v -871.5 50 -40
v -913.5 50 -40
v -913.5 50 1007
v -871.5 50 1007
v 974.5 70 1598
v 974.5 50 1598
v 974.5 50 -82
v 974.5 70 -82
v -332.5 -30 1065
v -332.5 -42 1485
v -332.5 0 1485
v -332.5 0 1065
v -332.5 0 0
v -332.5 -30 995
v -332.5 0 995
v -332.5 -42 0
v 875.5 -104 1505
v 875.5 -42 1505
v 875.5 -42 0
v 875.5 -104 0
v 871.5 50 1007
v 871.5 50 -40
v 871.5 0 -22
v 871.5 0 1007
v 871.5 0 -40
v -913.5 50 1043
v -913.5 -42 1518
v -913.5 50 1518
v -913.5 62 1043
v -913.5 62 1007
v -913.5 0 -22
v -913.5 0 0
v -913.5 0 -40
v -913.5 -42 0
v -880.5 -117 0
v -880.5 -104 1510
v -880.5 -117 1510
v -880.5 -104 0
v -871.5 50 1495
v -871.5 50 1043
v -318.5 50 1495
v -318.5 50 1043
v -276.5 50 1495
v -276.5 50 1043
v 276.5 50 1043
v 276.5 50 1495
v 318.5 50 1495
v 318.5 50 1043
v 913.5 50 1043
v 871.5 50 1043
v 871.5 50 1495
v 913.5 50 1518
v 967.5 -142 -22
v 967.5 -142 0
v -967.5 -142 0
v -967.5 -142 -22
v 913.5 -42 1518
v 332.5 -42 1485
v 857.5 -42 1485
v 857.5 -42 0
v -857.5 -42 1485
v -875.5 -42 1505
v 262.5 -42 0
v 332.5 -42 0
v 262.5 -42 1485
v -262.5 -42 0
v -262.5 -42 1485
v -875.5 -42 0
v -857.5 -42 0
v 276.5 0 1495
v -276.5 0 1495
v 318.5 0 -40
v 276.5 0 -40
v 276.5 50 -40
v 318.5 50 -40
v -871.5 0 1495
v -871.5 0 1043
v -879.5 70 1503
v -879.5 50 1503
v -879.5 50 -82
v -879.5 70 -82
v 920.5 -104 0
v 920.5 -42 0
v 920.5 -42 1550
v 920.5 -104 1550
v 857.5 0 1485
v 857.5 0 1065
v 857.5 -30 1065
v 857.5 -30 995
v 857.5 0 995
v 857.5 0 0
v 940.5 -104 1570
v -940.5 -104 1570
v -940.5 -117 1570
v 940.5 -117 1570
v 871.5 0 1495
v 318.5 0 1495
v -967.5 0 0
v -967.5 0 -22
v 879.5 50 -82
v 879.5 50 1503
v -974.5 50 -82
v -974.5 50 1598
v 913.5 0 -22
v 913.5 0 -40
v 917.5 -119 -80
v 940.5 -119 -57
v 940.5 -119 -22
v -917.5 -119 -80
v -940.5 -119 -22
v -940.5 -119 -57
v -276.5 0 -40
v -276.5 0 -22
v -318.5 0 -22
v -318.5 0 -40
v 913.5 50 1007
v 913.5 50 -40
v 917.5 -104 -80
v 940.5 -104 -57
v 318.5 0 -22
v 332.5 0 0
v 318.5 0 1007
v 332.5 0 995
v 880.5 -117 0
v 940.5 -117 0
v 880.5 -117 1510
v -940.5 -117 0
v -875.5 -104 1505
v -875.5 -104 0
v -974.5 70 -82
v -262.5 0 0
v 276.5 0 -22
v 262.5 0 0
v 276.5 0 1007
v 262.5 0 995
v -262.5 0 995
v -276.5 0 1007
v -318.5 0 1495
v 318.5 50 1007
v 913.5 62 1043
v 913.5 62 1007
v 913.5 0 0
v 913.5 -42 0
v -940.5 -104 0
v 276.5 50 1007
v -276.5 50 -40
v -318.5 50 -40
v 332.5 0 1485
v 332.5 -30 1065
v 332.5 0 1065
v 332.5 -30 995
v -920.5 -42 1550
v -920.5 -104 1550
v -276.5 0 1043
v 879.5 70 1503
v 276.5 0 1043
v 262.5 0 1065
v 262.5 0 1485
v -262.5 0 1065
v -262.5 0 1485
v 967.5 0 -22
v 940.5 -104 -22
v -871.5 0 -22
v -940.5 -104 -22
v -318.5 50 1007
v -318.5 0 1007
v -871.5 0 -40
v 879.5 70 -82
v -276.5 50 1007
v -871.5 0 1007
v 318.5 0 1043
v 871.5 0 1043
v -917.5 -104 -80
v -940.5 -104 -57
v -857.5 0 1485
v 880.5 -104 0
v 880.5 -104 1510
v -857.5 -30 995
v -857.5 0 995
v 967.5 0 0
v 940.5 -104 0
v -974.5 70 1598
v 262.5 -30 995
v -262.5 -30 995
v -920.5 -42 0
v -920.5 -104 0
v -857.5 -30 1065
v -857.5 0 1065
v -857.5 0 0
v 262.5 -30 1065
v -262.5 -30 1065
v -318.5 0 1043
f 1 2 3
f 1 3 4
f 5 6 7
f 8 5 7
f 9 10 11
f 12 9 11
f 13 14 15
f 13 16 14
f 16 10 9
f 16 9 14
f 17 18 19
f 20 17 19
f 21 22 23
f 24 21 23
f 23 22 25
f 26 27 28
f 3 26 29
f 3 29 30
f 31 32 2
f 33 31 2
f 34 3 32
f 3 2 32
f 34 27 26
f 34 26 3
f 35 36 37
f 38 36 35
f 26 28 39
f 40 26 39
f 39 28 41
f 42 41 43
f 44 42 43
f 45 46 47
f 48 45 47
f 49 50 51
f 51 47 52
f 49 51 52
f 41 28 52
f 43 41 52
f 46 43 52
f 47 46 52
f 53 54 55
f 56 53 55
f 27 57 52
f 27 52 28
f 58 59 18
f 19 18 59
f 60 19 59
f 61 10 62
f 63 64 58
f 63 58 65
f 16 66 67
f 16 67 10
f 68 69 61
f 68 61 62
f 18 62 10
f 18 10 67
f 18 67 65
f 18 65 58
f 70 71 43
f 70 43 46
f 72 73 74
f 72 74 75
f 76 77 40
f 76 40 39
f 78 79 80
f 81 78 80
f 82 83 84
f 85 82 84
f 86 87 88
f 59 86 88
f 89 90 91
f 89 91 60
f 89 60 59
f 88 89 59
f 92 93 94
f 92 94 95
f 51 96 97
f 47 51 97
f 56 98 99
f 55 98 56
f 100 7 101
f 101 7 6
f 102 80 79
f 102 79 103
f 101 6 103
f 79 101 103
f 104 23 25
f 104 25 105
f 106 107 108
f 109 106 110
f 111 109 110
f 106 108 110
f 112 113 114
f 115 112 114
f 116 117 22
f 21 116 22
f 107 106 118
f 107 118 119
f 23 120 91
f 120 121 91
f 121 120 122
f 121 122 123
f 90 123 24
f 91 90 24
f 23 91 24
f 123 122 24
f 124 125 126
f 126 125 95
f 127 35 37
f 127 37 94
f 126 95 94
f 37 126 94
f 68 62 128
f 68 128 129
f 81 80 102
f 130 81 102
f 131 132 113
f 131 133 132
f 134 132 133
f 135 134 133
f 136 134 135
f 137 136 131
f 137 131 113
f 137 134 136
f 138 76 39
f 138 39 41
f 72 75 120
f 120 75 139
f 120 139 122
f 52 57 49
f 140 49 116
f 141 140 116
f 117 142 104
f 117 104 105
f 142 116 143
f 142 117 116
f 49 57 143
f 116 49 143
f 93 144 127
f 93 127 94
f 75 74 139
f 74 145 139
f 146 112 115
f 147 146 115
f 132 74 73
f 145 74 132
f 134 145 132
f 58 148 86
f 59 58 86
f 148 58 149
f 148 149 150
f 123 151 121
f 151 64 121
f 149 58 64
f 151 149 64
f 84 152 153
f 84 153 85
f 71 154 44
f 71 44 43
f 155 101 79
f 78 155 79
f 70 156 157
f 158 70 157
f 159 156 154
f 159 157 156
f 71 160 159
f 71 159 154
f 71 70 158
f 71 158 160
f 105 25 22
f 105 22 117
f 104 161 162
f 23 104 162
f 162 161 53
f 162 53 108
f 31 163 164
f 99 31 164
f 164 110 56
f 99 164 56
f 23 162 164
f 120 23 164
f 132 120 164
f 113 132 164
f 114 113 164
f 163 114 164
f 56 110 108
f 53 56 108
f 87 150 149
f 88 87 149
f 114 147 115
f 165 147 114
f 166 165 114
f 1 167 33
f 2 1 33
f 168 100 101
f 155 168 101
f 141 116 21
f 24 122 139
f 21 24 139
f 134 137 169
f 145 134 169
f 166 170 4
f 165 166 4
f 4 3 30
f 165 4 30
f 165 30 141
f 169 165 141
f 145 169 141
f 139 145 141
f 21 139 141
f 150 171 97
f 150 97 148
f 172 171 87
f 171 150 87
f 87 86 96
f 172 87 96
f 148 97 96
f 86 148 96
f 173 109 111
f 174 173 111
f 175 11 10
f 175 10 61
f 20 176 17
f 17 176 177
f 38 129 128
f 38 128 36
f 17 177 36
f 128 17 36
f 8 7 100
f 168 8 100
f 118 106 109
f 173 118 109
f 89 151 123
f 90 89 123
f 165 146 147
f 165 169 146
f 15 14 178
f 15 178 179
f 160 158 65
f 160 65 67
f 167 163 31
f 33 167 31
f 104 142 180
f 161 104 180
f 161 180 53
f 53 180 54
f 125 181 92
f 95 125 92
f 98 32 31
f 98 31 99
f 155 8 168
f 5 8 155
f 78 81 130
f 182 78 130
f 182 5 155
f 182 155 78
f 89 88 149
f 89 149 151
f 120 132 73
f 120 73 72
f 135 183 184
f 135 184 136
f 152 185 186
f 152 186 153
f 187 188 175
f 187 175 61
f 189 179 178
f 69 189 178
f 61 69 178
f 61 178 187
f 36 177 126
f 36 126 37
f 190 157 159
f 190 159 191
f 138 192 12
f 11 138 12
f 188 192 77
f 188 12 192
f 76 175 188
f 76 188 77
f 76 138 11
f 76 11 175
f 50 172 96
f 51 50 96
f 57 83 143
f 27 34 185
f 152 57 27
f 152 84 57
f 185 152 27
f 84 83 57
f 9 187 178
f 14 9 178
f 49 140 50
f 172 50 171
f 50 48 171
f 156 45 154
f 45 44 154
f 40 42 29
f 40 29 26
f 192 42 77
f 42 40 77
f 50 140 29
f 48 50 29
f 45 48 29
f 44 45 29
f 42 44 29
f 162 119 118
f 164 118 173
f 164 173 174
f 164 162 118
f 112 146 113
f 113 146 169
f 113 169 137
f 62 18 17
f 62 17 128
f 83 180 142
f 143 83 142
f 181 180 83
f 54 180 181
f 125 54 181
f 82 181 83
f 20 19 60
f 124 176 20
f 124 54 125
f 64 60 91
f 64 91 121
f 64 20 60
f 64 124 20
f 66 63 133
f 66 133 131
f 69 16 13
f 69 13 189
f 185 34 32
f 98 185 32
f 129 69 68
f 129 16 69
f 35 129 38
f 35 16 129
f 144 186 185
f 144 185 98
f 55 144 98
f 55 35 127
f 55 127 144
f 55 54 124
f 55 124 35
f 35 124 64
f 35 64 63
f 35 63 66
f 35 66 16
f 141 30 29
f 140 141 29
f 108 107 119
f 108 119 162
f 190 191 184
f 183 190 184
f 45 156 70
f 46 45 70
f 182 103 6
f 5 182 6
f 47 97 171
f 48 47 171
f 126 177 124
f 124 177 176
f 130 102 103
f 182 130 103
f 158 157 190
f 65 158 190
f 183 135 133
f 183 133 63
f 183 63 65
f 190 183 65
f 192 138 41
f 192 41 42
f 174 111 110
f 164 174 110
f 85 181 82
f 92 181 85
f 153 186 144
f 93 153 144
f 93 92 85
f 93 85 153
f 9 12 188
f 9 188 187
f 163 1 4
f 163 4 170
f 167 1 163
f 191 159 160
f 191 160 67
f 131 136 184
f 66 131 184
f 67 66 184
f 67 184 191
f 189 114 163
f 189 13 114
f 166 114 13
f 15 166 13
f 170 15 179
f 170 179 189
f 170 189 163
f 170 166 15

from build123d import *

# Parameters (mm, degrees)
F1_DEPTH  = 1485
F2_W      = 913.5
F2_H      = 42
F3_DEPTH  = 33
F4_W      = 967.5
F4_H      = 142
F5_DEPTH  = 22
F7_DEPTH  = 913.5
F9_DEPTH  = 62
F11_DEPTH = 13
F14_DEPTH = 15
F16_DEPTH = 50
F17_W     = 42
F17_H     = 50
F18_DEPTH = 40
F21_DEPTH = 20


with BuildPart() as f1:
    # F0 (on Top) → F1 (new body)
    with BuildSketch(Plane.XY):
        Polygon((276.5, 50), (276.5, 0), (262.5, 0), (262.5, -42), (332.5, -42), (332.5, 0), (318.5, 0), (318.5, 50), align=None)
    extrude(amount=F1_DEPTH)



with BuildPart() as f1b:
    # F0 (on Top) → F1, piece 2 (new body)
    with BuildSketch(Plane.XY):
        Polygon((871.5, 0), (857.5, 0), (857.5, -42), (913.5, -42), (913.5, 50), (871.5, 50), align=None)
    extrude(amount=F1_DEPTH)


with BuildPart() as f1_1:
    add(f1.part)

    add(f1b.part)  # F3 merges F1b
    # F2 (on face) → F3 (join)
    with BuildSketch(Plane.XY.offset(1485)):
        with Locations((456.75, -21)):
            Rectangle(F2_W, F2_H)
    extrude(amount=F3_DEPTH)

    # F4 (on face) → F5 (join)
    with BuildSketch(Plane(origin=(0, 0, 0), x_dir=(1, 0, 0), z_dir=(0, 0, -1))):
        with Locations((483.75, 71)):
            Rectangle(F4_W, F4_H)
    extrude(amount=F5_DEPTH)

    # F6 (on face) → F7 (join, through all)
    with BuildSketch(Plane.YZ.offset(913.5)):
        Polygon((0, 1065), (-30, 1065), (-30, 995), (0, 995), (0, 1007), (62, 1007), (62, 1043), (0, 1043), align=None)
    extrude(amount=-F7_DEPTH)

    # F8 (on face) → F9 (join)
    with BuildSketch(Plane.XZ.offset(42)):
        Polygon((875.5, 1505), (875.5, 0), (920.5, 0), (920.5, 1550), (0, 1550), (0, 1505), align=None)
    extrude(amount=F9_DEPTH)

    # F10 (on face) → F11 (join)
    with BuildSketch(Plane.XZ.offset(104)):
        Polygon((880.5, 1510), (880.5, 0), (940.5, 0), (940.5, 1570), (0, 1570), (0, 1510), align=None)
    extrude(amount=F11_DEPTH)

    # F13 (on offset) → F14 (join)
    with BuildSketch(Plane.XZ.offset(119)):
        Polygon((940.5, -57), (940.5, -22), (0, -22), (0, -80), (917.5, -80), align=None)
    extrude(amount=-F14_DEPTH)

    # F15 (on face) → F16 (join, through all)
    with BuildSketch(Plane(origin=(0, 0, 0), x_dir=(-1, 0, 0), z_dir=(0, 1, 0))):
        Polygon((-913.5, 1518), (-913.5, 1485), (-871.5, 1485), (-871.5, 1495), (-318.5, 1495), (-318.5, 1485), (-276.5, 1485), (-276.5, 1495), (0, 1495), (0, 1518), align=None)
    extrude(amount=F16_DEPTH)

    # F17 (on face) → F18 (join)
    with BuildSketch(Plane(origin=(0, 0, 0), x_dir=(1, 0, 0), z_dir=(0, 0, -1))):
        with Locations((297.5, -25)):
            Rectangle(F17_W, F17_H)
        with Locations((892.5, -25)):
            Rectangle(F17_W, F17_H)
    extrude(amount=F18_DEPTH)

    # F19: F1 across plane


with BuildPart() as f1_2:
    add(f1_1.part)
    add(f1_1.part.mirror(Plane.YZ))


with BuildPart() as f21:
    # F20 (on face) → F21 (new body)
    with BuildSketch(Plane(origin=(0, 50, 0), x_dir=(-1, 0, 0), z_dir=(0, 1, 0))):
        Polygon((-879.5, -82), (-879.5, 1503), (879.5, 1503), (879.5, -82), (974.5, -82), (974.5, 1598), (-974.5, 1598), (-974.5, -82), align=None)
    extrude(amount=F21_DEPTH)


solid = Compound([f1_2.part, f21.part])
